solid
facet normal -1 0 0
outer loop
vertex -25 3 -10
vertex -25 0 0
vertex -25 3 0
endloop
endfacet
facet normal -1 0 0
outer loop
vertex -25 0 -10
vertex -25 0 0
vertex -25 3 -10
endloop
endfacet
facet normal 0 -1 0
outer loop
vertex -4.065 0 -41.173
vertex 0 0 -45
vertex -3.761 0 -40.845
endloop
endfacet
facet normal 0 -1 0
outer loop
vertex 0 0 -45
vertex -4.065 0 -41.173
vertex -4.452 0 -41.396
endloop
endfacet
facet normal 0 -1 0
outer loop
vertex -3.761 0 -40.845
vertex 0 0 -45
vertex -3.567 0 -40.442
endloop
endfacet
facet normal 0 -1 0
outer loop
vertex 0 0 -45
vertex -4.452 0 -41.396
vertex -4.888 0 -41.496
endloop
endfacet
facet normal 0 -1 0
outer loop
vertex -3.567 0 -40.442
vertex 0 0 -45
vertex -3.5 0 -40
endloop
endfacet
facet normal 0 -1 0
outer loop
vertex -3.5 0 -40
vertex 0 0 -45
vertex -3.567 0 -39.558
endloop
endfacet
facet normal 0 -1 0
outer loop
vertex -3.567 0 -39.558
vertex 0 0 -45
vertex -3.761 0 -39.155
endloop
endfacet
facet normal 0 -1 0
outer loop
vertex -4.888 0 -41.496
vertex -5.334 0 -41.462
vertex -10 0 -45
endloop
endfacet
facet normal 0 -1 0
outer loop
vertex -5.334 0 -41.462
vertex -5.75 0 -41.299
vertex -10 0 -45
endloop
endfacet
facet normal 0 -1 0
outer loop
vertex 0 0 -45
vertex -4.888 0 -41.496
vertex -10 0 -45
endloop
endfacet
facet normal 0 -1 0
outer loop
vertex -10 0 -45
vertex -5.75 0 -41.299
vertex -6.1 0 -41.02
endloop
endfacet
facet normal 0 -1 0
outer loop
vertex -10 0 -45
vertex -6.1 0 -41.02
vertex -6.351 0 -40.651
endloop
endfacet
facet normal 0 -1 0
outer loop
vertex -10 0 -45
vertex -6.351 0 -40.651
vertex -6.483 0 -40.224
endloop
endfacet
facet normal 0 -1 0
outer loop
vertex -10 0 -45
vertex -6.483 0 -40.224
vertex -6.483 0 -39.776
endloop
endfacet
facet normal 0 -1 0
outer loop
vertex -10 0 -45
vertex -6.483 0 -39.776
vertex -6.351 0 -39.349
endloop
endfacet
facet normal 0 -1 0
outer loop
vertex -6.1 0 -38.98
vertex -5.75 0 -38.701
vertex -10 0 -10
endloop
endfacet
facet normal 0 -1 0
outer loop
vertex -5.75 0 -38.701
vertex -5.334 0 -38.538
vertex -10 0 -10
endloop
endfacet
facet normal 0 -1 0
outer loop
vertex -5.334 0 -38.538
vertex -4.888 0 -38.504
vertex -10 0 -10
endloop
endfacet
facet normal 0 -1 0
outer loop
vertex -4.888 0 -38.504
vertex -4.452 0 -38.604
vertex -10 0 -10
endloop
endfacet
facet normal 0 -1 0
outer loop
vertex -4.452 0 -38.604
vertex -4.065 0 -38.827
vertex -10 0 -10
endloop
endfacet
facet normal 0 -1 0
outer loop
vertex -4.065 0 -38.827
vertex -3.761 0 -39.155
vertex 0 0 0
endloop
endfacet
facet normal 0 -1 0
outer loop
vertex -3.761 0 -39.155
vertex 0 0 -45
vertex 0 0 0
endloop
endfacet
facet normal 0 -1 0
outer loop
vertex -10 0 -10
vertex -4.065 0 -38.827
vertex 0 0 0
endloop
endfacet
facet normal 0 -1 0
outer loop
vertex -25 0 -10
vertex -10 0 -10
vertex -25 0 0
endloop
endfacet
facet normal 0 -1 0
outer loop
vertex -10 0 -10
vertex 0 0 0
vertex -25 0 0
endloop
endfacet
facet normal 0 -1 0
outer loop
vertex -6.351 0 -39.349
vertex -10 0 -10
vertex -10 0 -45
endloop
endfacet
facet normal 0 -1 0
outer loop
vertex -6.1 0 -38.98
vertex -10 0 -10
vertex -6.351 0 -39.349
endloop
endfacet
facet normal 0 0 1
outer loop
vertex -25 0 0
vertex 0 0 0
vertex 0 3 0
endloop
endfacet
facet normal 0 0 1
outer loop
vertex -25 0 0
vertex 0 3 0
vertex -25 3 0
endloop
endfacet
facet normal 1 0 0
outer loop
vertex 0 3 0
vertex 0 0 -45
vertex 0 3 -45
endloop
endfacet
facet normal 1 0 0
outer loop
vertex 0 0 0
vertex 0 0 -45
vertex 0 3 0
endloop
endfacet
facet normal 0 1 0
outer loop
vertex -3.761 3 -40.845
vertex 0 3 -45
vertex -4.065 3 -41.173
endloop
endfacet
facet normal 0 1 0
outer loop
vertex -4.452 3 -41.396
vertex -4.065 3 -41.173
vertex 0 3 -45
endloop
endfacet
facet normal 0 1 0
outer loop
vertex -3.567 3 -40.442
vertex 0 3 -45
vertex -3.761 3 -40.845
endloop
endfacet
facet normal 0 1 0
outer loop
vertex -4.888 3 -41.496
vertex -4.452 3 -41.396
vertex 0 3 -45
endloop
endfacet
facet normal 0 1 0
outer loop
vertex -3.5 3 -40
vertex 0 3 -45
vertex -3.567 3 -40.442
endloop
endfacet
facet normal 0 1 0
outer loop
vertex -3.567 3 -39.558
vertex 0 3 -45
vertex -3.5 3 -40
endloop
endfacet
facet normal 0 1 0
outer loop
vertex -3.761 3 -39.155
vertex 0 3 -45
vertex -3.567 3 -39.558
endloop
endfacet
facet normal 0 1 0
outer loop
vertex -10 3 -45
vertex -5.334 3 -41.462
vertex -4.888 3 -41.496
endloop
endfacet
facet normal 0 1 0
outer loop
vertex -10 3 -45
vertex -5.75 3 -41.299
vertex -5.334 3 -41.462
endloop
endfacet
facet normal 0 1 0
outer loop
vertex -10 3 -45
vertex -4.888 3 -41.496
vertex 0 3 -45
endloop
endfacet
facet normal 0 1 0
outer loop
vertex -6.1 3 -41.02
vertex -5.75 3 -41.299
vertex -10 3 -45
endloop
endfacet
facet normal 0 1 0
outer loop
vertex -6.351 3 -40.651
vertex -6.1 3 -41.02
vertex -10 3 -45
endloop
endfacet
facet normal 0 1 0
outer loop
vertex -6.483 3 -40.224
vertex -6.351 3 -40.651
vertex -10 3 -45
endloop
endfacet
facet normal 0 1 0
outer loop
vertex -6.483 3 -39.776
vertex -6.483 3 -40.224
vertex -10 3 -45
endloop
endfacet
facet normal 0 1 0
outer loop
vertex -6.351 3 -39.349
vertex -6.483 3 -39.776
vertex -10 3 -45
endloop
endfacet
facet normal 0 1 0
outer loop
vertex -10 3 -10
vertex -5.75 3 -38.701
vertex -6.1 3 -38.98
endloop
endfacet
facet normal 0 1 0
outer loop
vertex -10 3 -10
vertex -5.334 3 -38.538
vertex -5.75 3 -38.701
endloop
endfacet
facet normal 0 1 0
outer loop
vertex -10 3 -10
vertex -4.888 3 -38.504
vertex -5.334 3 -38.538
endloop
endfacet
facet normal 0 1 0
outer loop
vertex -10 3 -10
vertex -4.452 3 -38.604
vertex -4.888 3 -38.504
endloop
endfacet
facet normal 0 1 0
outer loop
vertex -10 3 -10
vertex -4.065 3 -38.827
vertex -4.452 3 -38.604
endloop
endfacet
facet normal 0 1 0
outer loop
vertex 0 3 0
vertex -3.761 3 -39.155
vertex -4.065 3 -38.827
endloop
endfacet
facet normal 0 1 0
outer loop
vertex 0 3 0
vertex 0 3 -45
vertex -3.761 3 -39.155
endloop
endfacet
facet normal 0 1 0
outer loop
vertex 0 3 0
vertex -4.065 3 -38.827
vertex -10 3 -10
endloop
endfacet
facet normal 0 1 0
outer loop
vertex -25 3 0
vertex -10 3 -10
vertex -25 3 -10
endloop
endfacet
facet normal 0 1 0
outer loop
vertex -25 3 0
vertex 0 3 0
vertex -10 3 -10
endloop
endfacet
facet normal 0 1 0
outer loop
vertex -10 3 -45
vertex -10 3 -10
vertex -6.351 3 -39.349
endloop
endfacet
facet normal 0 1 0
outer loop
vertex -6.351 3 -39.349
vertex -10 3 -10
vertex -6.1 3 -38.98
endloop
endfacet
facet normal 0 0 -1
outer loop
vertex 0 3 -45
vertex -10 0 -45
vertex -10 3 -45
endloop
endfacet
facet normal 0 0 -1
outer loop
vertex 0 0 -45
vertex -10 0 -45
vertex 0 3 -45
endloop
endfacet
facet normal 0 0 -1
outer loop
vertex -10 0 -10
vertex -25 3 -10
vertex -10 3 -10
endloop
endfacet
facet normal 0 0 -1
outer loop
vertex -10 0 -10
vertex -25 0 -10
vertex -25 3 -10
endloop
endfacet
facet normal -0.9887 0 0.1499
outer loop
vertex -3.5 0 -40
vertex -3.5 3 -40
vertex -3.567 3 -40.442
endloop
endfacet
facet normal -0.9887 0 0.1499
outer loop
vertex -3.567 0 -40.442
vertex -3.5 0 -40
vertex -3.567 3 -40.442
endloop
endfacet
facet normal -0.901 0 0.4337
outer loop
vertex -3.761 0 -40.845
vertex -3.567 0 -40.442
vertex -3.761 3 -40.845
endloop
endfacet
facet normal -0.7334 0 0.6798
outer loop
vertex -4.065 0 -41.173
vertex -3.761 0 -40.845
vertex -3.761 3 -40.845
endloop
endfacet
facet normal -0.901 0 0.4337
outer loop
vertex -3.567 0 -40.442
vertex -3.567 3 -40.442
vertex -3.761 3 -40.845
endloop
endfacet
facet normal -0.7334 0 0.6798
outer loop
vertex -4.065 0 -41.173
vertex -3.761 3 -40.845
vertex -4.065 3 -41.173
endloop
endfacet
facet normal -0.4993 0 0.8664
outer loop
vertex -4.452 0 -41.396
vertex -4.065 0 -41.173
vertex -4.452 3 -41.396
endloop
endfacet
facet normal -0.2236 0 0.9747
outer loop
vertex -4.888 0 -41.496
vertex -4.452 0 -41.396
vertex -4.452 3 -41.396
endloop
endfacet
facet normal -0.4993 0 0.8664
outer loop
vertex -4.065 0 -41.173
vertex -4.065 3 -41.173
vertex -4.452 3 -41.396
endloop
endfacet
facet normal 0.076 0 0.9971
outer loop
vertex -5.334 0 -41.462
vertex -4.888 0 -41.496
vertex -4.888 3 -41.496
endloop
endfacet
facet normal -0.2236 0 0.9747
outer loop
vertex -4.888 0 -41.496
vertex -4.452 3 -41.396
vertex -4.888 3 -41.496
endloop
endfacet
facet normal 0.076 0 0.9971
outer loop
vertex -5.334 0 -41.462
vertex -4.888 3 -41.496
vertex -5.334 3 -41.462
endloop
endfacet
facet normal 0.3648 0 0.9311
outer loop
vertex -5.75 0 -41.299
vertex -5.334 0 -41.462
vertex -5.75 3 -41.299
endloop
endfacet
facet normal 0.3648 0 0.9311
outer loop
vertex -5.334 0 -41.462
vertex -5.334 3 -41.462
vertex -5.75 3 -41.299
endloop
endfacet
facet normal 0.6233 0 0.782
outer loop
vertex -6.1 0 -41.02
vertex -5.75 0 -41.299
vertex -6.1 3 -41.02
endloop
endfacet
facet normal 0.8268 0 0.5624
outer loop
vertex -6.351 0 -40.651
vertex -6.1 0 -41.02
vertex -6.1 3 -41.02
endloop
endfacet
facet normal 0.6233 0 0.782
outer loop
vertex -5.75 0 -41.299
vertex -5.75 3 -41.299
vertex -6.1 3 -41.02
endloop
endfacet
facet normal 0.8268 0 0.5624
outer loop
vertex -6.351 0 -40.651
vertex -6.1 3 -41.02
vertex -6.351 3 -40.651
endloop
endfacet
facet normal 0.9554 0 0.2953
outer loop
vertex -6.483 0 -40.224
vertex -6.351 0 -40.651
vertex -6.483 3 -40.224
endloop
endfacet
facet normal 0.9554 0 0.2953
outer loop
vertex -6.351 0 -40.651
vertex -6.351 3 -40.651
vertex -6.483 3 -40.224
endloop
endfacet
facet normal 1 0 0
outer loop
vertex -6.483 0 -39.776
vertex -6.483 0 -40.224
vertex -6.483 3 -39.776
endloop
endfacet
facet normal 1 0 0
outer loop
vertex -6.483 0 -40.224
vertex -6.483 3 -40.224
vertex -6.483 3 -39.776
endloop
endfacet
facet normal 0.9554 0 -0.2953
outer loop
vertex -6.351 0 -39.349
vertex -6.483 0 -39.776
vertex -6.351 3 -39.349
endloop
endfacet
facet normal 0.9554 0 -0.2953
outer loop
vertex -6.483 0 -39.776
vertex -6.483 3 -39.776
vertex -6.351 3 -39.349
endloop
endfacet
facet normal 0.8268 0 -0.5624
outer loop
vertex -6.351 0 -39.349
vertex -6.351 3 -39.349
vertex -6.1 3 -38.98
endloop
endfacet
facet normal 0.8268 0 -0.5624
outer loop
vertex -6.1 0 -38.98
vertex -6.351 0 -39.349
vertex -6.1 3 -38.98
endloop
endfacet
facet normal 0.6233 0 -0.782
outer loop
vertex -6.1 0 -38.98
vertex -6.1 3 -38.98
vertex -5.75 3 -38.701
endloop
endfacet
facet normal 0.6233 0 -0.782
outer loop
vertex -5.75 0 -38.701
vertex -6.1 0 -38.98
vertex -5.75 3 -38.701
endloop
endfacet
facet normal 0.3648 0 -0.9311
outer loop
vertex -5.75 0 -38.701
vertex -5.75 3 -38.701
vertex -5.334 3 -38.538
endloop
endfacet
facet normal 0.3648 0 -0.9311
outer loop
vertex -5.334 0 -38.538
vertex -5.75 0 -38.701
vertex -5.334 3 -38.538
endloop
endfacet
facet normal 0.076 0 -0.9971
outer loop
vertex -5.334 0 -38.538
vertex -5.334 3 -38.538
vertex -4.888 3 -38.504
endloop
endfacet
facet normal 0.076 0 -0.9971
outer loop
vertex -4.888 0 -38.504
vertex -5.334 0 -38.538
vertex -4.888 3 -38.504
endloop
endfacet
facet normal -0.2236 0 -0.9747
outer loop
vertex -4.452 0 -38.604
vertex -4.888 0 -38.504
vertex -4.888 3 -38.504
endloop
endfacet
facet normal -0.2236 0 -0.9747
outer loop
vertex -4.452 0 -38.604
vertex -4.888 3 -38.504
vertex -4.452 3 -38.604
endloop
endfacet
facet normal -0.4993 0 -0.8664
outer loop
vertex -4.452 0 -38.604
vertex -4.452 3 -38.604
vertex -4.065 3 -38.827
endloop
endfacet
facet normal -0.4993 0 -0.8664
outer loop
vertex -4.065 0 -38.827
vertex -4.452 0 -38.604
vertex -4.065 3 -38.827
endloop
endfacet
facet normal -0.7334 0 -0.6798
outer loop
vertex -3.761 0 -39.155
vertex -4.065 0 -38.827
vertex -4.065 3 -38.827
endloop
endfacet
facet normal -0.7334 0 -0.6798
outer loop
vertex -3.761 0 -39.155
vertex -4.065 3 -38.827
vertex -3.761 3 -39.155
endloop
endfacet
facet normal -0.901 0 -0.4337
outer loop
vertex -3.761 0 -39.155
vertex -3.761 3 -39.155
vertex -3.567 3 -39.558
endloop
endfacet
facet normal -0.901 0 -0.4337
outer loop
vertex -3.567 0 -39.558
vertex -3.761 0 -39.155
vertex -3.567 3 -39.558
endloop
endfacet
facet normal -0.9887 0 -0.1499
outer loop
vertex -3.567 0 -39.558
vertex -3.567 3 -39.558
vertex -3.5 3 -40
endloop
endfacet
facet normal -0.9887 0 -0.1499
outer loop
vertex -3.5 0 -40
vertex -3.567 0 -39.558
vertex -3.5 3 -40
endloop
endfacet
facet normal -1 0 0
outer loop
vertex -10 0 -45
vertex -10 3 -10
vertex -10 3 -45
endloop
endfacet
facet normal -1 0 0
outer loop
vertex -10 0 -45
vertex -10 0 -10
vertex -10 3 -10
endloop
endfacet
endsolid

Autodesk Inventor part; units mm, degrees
ref_plane "YZ Plane" through (0, 0, 0) normal (1, 0, 0) x (0, 1, 0)
ref_plane "XZ Plane" through (0, 0, 0) normal (0, 1, 0) x (-1, 0, 0)
ref_plane "XY Plane" through (0, 0, 0) normal (0, 0, 1) x (1, 0, 0)
sketch "Sketch1" plane through (0, 0, 0) normal (0, 1, 0) x (-1, 0, 0)
  line L0 (0, 0) -> (10, 0)
  line L1 (10, -10) -> (10, -45)
  line L2 (10, -45) -> (0, -45)
  line L3 (0, -45) -> (0, 0)
  line L4 (0, 0) -> (25, 0)
  line L5 (25, 0) -> (25, -10)
  line L6 (25, -10) -> (10, -10)
  line L7 (0, -10) -> (0, 0)
  dimension "d0" = 10
  dimension "d1" = 45
  dimension "d3" = 10
  dimension "d6" = 25
extrude "Extrusion1" add sketch "Sketch1" along normal blind 3
sketch "Sketch2" plane through (0, 3, 0) normal (0, 1, 0) x (1, 0, 0)
  line L0 (0, 45) -> (-10, 45) construction
  line L1 (-10, 45) -> (0, 35) construction
  line L2 (0, 0) -> (0, 45) construction
  line L3 (0, 45) -> (-10, 35) construction
  line L4 (-10, 45) -> (-10, 10) construction
  circle A0 centre (-5, 40) radius 1.5
  dimension "d7" = 135
  dimension "d8" = 45
  dimension "d9" = 3
extrude "Extrusion2" cut sketch "Sketch2" against normal blind 10
properties part number "makerbeam_L-bracket" material "Acetal Resin, Black"
